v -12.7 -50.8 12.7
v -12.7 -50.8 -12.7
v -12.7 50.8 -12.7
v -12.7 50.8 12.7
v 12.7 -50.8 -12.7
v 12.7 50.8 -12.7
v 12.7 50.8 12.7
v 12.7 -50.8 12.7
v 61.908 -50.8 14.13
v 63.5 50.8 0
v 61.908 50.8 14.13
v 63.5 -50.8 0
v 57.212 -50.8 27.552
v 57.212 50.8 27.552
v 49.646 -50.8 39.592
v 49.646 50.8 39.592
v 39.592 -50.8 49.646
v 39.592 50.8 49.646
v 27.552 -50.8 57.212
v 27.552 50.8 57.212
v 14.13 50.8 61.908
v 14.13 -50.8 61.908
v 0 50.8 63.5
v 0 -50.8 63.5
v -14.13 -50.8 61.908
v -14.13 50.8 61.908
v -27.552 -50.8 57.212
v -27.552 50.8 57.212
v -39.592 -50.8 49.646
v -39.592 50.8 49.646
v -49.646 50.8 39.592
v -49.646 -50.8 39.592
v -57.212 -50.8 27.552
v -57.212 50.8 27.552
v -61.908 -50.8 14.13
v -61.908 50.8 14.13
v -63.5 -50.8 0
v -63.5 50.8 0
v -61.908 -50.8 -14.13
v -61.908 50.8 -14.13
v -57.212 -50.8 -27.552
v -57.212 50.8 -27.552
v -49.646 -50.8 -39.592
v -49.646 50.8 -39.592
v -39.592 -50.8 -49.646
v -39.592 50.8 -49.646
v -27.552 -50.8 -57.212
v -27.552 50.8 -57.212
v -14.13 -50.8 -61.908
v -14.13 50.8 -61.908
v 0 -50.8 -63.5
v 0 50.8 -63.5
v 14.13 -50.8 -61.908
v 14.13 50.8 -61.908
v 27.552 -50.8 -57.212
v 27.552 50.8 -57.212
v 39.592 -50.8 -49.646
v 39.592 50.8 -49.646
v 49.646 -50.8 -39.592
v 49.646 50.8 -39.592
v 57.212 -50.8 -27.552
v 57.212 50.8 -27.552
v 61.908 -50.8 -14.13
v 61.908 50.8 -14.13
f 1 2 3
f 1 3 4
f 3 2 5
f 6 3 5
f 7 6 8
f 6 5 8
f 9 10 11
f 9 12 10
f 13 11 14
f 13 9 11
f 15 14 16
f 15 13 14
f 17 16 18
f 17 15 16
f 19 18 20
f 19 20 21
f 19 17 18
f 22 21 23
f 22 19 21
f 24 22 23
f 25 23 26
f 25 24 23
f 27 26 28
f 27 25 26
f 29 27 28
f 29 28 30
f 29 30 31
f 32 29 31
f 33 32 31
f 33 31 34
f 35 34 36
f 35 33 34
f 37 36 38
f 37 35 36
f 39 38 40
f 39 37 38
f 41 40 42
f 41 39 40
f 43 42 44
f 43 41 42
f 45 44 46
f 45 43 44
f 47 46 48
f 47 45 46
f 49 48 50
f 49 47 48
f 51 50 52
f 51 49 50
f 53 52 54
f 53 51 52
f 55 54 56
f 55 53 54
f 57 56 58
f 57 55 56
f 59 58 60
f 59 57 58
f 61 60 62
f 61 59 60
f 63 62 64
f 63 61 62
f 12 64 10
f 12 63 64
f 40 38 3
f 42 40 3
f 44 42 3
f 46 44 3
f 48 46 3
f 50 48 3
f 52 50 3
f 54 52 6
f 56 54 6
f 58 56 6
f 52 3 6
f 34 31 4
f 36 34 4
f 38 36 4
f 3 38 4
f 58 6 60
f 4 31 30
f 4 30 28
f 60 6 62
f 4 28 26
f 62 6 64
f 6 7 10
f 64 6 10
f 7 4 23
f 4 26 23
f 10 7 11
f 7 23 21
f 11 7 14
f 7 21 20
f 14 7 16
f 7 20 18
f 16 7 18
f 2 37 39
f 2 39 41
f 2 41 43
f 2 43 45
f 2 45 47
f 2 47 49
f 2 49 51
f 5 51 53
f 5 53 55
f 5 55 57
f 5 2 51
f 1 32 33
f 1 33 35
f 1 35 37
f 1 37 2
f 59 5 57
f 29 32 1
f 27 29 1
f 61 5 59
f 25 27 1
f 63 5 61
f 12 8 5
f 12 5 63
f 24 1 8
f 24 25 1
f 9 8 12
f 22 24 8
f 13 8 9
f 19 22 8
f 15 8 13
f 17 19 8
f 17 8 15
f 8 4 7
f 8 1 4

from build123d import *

# Parameters (mm, degrees)
F0_R     = 63.5
F0_W     = 25.4
F0_H     = 25.4
F1_DEPTH = 50.8
F2_DEPTH = 50.8


with BuildPart() as f1:
    # F0 (on Front) → F1 (new body)
    with BuildSketch(Plane.XZ):
        Circle(F0_R)
        Rectangle(F0_W, F0_H, mode=Mode.SUBTRACT)
    extrude(amount=F1_DEPTH)

    # F0 (on Front) → F2 (join)
    with BuildSketch(Plane.XZ):
        Circle(F0_R)
        Rectangle(F0_W, F0_H, mode=Mode.SUBTRACT)
    extrude(amount=-F2_DEPTH)


solid = f1.part
